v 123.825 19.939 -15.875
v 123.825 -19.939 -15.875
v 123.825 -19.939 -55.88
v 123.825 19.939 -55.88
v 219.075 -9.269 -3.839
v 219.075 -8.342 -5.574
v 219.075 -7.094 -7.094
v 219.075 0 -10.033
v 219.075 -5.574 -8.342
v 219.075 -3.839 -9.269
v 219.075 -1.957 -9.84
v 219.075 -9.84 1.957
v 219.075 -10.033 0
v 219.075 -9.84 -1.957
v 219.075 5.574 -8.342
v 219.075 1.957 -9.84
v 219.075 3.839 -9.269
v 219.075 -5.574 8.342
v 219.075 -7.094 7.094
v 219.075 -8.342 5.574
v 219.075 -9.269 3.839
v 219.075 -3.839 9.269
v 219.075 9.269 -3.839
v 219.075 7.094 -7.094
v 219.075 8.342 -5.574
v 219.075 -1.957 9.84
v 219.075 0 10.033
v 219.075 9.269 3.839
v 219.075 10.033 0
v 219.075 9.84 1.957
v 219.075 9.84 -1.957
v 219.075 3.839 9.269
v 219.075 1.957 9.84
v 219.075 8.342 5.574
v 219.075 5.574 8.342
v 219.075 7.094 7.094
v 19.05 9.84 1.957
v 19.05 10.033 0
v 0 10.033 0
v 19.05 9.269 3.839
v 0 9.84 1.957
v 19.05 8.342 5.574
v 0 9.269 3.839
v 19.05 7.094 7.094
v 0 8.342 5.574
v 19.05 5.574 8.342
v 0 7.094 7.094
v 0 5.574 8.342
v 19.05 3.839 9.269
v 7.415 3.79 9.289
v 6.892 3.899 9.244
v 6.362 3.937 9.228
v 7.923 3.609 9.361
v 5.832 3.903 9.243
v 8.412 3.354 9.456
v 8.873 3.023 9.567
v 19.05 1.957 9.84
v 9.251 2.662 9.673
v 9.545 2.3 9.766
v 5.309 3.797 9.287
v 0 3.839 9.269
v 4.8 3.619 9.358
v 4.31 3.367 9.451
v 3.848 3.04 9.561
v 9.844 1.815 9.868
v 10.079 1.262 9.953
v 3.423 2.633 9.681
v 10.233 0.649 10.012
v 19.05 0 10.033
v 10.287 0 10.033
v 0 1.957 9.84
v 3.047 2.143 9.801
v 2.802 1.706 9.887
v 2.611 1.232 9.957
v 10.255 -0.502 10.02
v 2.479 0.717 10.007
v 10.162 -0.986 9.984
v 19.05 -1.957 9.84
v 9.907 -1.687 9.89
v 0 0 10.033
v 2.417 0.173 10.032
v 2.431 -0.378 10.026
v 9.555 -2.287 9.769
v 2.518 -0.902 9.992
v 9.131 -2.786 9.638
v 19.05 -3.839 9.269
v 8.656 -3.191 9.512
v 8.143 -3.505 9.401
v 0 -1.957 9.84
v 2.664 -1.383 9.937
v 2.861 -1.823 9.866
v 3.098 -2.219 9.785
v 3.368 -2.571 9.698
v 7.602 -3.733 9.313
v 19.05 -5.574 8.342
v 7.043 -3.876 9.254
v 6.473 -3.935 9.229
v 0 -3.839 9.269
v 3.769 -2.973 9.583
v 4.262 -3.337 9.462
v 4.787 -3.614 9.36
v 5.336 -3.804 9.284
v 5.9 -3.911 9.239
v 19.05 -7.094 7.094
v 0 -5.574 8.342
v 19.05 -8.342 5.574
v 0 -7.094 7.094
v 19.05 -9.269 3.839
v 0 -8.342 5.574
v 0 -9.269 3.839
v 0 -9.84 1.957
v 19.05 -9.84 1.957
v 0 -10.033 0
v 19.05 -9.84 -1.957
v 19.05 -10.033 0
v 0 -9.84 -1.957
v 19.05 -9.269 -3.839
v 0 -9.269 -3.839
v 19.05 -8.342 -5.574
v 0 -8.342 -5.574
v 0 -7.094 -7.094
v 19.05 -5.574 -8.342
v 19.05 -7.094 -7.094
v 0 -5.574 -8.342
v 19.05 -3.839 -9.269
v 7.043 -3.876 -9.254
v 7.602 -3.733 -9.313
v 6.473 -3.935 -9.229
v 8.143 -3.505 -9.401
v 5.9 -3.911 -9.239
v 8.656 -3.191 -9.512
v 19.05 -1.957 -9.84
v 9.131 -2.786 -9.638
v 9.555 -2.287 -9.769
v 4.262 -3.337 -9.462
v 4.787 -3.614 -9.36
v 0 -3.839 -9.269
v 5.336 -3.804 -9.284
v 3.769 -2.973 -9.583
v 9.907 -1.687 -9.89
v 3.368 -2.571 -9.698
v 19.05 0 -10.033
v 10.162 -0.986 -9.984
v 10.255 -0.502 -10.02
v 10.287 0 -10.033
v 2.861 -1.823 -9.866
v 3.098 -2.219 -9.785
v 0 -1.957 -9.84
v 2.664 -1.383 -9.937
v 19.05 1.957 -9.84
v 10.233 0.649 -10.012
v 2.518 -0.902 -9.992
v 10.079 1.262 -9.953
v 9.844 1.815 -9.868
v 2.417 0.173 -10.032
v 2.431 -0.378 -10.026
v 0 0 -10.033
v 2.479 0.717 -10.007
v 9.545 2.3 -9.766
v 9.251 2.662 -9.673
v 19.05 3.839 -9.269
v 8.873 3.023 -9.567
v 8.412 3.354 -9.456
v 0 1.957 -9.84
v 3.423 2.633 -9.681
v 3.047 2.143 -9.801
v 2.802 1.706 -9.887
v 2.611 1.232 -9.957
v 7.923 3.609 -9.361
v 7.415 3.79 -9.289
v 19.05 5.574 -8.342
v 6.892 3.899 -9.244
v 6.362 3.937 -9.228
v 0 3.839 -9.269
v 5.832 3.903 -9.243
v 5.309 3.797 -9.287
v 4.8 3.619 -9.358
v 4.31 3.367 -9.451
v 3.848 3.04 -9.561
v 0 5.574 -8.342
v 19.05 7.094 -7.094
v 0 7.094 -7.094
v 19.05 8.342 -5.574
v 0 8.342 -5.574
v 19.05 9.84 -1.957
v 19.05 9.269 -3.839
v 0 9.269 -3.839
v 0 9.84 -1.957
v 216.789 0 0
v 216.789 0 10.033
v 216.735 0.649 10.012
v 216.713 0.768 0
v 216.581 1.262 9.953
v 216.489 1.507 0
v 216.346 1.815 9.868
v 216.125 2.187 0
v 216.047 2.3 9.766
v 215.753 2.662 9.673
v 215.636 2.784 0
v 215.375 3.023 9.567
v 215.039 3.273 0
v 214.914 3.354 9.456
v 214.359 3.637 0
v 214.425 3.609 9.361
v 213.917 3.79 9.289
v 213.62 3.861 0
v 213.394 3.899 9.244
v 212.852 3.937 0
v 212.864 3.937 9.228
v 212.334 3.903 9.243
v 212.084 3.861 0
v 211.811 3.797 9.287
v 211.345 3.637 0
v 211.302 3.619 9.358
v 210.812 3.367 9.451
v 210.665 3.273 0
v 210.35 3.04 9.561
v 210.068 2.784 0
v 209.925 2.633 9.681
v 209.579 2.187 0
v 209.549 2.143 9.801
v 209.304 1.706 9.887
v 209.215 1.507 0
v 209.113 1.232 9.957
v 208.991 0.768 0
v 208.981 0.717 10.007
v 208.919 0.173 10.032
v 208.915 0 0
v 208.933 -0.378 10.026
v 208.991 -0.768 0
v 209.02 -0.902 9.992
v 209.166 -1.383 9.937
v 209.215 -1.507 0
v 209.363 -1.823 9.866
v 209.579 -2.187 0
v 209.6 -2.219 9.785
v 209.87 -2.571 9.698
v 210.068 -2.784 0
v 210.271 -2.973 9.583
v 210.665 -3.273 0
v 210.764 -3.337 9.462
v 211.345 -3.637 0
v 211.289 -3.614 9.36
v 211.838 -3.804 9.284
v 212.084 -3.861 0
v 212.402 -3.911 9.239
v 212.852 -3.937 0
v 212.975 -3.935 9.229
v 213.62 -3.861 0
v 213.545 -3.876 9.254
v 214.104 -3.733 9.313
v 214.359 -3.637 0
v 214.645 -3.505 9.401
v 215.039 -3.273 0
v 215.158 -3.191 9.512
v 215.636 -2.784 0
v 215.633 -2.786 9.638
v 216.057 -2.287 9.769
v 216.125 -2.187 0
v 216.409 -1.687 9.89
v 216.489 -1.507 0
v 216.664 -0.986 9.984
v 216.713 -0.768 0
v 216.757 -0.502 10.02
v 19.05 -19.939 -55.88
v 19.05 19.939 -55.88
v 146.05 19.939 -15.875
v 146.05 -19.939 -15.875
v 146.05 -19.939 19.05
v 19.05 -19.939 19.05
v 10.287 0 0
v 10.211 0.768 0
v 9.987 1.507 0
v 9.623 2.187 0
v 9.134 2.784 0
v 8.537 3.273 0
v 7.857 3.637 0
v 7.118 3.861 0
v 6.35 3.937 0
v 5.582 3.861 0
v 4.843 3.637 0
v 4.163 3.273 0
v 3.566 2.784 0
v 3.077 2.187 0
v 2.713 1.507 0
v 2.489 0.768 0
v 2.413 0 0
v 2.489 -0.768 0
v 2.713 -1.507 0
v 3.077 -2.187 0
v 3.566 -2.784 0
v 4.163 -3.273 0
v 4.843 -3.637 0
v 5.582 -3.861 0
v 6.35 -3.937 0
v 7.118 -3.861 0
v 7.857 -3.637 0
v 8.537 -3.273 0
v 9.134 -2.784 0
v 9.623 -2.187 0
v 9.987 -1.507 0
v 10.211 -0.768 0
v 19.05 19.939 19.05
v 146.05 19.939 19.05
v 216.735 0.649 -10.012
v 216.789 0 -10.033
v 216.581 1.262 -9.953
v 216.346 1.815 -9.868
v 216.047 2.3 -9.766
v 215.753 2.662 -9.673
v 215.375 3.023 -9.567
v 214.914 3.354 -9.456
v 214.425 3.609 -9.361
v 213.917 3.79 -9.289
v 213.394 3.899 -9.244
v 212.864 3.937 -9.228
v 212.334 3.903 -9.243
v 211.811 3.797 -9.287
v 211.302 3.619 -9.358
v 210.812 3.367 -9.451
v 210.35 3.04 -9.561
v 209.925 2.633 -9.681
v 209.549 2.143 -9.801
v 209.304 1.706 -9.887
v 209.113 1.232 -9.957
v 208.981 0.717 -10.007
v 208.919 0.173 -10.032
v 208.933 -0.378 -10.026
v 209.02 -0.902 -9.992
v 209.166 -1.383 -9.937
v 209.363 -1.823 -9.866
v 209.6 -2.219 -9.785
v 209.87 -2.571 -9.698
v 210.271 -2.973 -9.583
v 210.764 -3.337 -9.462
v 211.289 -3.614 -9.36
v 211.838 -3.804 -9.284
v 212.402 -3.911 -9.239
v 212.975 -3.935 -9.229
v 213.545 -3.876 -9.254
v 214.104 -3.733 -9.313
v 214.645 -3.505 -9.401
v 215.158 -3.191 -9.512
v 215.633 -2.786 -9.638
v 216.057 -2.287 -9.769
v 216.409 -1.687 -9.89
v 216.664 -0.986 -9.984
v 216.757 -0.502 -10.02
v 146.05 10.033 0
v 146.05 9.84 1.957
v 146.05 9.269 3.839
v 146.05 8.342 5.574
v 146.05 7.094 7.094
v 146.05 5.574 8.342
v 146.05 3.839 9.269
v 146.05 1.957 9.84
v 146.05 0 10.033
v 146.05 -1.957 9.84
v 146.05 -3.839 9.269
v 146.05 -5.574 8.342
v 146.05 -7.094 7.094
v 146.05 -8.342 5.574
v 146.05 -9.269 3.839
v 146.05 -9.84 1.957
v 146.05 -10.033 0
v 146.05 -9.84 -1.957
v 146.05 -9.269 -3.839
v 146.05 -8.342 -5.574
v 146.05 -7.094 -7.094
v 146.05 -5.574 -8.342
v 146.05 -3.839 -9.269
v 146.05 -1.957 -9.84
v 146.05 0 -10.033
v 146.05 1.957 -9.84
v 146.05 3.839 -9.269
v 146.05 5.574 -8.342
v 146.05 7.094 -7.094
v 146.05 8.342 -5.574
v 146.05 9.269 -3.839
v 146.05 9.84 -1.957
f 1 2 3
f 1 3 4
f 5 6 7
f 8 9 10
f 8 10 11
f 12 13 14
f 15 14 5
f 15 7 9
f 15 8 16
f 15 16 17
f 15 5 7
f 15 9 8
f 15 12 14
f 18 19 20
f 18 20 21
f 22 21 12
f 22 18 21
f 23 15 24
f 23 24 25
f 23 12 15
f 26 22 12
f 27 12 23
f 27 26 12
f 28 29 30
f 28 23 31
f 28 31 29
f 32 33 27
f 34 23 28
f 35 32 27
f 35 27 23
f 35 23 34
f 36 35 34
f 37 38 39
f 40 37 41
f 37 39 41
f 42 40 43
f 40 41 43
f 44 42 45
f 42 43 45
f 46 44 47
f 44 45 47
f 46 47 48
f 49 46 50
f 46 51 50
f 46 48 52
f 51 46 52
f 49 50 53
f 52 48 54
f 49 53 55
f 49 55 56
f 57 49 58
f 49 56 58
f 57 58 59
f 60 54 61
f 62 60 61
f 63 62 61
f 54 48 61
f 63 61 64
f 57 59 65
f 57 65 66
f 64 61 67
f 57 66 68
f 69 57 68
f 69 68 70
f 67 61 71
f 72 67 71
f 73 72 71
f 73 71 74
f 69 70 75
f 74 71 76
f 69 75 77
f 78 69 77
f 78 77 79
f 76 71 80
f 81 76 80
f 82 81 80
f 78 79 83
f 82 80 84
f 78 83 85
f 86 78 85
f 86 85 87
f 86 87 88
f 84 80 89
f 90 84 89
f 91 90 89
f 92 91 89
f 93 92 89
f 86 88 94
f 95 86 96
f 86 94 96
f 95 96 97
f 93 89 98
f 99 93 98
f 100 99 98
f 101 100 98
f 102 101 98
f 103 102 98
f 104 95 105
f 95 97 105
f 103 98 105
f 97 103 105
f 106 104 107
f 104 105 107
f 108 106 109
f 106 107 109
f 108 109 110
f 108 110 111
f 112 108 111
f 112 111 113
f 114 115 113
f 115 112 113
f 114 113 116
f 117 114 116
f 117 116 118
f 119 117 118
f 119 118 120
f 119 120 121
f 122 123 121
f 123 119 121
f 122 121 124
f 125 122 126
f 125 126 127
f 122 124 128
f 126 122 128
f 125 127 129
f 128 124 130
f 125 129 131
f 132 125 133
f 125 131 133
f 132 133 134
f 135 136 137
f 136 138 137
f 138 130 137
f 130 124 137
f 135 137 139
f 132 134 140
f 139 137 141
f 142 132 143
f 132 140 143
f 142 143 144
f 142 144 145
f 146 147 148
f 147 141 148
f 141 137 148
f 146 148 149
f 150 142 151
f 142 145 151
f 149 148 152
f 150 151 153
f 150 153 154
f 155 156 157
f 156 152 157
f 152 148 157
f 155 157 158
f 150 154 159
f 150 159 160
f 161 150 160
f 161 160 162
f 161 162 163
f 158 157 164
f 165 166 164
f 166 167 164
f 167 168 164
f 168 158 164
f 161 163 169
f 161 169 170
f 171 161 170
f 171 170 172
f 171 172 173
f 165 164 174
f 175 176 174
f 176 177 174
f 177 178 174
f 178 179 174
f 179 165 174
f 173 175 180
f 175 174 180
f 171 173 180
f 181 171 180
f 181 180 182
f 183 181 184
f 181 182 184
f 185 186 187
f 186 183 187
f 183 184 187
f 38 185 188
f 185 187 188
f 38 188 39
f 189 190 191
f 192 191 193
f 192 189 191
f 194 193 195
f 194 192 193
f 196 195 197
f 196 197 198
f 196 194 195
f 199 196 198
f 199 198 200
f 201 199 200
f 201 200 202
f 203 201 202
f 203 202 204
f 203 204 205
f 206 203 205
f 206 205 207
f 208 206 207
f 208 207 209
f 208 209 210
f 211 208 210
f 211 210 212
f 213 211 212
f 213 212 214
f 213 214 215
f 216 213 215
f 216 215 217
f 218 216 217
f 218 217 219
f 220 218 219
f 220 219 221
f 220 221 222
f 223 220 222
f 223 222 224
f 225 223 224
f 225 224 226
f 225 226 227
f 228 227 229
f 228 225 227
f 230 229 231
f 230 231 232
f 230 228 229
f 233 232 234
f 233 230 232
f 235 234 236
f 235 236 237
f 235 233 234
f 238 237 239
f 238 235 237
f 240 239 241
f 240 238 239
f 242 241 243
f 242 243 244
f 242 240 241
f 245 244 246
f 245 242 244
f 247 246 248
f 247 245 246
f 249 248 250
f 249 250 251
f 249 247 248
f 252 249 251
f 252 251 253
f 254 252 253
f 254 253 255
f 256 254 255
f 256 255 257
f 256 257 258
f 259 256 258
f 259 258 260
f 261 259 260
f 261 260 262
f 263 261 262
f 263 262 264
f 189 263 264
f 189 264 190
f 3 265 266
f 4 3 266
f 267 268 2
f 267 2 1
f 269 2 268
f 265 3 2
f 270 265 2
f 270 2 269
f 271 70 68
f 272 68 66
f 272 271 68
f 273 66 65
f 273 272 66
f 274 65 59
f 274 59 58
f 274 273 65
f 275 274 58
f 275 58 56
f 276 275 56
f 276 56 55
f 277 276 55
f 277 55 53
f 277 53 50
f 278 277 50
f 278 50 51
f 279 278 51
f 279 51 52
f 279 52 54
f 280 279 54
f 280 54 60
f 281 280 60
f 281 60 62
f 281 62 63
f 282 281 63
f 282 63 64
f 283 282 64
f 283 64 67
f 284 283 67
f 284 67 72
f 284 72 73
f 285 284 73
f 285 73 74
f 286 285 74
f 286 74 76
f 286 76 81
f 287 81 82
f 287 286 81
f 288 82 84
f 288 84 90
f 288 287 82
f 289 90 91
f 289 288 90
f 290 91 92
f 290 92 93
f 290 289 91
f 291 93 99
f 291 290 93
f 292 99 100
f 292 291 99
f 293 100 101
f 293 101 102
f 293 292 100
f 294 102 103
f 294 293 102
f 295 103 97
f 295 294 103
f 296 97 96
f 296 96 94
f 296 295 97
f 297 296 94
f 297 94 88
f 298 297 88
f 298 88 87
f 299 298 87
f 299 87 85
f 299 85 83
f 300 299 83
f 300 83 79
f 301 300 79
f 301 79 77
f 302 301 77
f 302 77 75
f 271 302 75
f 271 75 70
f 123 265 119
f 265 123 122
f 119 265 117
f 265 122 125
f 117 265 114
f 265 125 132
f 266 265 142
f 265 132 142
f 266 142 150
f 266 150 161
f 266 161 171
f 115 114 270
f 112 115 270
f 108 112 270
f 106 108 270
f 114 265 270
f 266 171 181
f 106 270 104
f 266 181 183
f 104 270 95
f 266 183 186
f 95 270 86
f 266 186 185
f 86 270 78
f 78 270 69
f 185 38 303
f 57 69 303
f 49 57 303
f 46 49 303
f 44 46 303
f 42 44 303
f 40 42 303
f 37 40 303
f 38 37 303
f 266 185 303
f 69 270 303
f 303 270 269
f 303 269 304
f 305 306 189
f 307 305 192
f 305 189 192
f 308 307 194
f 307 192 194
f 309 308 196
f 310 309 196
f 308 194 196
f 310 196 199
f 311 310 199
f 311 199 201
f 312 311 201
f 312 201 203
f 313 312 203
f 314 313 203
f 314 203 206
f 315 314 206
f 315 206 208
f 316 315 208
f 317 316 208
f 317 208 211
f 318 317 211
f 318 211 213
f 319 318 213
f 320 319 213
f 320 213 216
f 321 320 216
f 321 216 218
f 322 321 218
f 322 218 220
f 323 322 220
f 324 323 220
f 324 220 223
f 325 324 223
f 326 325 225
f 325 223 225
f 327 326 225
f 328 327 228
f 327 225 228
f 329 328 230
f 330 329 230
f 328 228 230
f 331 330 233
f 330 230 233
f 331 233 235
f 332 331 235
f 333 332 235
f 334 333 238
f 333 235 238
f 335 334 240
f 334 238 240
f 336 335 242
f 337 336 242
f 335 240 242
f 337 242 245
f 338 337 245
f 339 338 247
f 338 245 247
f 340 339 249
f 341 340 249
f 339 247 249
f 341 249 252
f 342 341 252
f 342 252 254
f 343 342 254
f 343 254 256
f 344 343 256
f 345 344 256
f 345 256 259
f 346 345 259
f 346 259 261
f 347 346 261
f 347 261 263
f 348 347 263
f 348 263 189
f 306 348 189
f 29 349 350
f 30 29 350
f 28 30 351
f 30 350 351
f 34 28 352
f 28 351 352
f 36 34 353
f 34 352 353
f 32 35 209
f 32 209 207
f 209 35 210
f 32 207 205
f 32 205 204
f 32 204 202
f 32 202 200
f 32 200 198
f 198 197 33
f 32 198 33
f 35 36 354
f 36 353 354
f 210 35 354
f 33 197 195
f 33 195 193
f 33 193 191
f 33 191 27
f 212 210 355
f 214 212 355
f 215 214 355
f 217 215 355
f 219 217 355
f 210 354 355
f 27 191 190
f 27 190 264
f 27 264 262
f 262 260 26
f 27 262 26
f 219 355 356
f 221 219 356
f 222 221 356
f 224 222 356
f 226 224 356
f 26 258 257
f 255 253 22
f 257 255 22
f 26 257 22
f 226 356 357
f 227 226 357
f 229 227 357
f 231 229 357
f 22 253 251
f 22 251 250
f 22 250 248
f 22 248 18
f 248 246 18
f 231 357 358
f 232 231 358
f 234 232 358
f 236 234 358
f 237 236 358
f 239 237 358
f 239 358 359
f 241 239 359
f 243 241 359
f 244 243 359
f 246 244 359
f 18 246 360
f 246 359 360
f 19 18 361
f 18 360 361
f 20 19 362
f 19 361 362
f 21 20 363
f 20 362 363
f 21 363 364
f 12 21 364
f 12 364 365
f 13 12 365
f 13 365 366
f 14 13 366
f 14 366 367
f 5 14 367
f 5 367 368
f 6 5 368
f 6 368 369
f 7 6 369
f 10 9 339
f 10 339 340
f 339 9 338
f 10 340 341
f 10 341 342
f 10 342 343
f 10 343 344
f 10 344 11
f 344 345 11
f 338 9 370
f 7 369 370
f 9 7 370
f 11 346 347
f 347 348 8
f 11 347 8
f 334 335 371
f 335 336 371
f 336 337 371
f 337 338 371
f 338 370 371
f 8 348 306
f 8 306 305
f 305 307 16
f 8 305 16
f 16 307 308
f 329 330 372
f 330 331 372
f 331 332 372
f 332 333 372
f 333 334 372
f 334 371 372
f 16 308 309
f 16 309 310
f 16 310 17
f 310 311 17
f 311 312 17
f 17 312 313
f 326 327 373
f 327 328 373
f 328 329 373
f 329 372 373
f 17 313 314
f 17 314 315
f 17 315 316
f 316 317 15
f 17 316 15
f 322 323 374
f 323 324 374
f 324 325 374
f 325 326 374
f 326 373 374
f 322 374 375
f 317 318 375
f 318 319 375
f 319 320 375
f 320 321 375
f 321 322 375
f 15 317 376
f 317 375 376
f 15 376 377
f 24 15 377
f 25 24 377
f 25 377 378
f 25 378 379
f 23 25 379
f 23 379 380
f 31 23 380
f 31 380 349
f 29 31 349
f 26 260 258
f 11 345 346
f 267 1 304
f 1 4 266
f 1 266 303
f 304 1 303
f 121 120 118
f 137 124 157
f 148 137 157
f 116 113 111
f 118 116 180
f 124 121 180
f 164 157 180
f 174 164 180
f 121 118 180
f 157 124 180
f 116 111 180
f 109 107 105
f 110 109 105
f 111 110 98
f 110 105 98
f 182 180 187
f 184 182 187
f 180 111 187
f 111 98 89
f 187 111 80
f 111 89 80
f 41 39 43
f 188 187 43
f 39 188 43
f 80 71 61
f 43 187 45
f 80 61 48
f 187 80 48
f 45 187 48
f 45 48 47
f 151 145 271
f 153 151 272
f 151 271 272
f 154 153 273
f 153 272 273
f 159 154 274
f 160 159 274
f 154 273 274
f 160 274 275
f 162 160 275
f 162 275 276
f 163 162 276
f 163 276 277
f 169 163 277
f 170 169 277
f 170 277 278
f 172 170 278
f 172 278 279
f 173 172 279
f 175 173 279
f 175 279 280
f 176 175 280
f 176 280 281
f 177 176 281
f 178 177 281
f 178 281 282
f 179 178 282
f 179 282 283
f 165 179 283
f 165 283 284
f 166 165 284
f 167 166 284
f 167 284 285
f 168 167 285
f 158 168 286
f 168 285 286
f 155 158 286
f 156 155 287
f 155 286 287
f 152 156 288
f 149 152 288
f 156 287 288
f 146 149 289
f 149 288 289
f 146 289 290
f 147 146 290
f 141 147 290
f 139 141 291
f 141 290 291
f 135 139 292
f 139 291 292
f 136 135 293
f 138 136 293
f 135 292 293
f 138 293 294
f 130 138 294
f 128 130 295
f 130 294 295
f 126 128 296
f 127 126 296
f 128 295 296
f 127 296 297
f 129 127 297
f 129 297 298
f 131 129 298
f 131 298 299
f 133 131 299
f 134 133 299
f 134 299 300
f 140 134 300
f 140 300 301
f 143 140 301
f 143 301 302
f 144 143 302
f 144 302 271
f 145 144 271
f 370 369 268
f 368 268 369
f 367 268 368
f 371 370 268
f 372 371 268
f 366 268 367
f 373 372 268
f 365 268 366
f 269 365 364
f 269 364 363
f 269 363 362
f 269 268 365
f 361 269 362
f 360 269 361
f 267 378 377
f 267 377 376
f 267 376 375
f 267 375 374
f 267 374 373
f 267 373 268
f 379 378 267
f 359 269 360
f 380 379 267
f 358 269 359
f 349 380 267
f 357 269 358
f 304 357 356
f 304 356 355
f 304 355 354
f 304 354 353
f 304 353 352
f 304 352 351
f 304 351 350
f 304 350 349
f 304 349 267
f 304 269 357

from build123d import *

# Parameters (mm, degrees)
F0_R          = 10.033
F1_DEPTH      = 219.075
F3_W          = 39.878
F3_H          = 74.93
F4_DEPTH      = 127
F5_W          = 39.878
F5_H          = 40.005
F6_DEPTH      = 22.225
F7_R          = 3.937
F8_DEPTH      = 55.881
F8_DEPTH_BACK = 19.051


with BuildPart() as f1:
    # F0 (on Right) → F1 (new body)
    with BuildSketch(Plane.YZ):
        Circle(F0_R)
    extrude(amount=F1_DEPTH)

    # F3 (on offset) → F4 (join)
    with BuildSketch(Plane.YZ.offset(19.05)):
        with Locations((0, -18.415)):
            Rectangle(F3_W, F3_H)
    extrude(amount=F4_DEPTH)

    # F5 (on face) → F6 (cut)
    with BuildSketch(Plane.YZ.offset(146.05)):
        with Locations((0, -35.8775)):
            Rectangle(F5_W, F5_H)
    extrude(amount=-F6_DEPTH, mode=Mode.SUBTRACT)

    # F7 (on Top) → F8 (cut, two sides)
    with BuildSketch(Plane.XY) as f8_sk:
        with Locations((6.35, 0)):
            Circle(F7_R)
        with Locations((212.852, 0)):
            Circle(F7_R)
    extrude(amount=-F8_DEPTH, mode=Mode.SUBTRACT)
    extrude(f8_sk.sketch, amount=F8_DEPTH_BACK, mode=Mode.SUBTRACT)


solid = f1.part
